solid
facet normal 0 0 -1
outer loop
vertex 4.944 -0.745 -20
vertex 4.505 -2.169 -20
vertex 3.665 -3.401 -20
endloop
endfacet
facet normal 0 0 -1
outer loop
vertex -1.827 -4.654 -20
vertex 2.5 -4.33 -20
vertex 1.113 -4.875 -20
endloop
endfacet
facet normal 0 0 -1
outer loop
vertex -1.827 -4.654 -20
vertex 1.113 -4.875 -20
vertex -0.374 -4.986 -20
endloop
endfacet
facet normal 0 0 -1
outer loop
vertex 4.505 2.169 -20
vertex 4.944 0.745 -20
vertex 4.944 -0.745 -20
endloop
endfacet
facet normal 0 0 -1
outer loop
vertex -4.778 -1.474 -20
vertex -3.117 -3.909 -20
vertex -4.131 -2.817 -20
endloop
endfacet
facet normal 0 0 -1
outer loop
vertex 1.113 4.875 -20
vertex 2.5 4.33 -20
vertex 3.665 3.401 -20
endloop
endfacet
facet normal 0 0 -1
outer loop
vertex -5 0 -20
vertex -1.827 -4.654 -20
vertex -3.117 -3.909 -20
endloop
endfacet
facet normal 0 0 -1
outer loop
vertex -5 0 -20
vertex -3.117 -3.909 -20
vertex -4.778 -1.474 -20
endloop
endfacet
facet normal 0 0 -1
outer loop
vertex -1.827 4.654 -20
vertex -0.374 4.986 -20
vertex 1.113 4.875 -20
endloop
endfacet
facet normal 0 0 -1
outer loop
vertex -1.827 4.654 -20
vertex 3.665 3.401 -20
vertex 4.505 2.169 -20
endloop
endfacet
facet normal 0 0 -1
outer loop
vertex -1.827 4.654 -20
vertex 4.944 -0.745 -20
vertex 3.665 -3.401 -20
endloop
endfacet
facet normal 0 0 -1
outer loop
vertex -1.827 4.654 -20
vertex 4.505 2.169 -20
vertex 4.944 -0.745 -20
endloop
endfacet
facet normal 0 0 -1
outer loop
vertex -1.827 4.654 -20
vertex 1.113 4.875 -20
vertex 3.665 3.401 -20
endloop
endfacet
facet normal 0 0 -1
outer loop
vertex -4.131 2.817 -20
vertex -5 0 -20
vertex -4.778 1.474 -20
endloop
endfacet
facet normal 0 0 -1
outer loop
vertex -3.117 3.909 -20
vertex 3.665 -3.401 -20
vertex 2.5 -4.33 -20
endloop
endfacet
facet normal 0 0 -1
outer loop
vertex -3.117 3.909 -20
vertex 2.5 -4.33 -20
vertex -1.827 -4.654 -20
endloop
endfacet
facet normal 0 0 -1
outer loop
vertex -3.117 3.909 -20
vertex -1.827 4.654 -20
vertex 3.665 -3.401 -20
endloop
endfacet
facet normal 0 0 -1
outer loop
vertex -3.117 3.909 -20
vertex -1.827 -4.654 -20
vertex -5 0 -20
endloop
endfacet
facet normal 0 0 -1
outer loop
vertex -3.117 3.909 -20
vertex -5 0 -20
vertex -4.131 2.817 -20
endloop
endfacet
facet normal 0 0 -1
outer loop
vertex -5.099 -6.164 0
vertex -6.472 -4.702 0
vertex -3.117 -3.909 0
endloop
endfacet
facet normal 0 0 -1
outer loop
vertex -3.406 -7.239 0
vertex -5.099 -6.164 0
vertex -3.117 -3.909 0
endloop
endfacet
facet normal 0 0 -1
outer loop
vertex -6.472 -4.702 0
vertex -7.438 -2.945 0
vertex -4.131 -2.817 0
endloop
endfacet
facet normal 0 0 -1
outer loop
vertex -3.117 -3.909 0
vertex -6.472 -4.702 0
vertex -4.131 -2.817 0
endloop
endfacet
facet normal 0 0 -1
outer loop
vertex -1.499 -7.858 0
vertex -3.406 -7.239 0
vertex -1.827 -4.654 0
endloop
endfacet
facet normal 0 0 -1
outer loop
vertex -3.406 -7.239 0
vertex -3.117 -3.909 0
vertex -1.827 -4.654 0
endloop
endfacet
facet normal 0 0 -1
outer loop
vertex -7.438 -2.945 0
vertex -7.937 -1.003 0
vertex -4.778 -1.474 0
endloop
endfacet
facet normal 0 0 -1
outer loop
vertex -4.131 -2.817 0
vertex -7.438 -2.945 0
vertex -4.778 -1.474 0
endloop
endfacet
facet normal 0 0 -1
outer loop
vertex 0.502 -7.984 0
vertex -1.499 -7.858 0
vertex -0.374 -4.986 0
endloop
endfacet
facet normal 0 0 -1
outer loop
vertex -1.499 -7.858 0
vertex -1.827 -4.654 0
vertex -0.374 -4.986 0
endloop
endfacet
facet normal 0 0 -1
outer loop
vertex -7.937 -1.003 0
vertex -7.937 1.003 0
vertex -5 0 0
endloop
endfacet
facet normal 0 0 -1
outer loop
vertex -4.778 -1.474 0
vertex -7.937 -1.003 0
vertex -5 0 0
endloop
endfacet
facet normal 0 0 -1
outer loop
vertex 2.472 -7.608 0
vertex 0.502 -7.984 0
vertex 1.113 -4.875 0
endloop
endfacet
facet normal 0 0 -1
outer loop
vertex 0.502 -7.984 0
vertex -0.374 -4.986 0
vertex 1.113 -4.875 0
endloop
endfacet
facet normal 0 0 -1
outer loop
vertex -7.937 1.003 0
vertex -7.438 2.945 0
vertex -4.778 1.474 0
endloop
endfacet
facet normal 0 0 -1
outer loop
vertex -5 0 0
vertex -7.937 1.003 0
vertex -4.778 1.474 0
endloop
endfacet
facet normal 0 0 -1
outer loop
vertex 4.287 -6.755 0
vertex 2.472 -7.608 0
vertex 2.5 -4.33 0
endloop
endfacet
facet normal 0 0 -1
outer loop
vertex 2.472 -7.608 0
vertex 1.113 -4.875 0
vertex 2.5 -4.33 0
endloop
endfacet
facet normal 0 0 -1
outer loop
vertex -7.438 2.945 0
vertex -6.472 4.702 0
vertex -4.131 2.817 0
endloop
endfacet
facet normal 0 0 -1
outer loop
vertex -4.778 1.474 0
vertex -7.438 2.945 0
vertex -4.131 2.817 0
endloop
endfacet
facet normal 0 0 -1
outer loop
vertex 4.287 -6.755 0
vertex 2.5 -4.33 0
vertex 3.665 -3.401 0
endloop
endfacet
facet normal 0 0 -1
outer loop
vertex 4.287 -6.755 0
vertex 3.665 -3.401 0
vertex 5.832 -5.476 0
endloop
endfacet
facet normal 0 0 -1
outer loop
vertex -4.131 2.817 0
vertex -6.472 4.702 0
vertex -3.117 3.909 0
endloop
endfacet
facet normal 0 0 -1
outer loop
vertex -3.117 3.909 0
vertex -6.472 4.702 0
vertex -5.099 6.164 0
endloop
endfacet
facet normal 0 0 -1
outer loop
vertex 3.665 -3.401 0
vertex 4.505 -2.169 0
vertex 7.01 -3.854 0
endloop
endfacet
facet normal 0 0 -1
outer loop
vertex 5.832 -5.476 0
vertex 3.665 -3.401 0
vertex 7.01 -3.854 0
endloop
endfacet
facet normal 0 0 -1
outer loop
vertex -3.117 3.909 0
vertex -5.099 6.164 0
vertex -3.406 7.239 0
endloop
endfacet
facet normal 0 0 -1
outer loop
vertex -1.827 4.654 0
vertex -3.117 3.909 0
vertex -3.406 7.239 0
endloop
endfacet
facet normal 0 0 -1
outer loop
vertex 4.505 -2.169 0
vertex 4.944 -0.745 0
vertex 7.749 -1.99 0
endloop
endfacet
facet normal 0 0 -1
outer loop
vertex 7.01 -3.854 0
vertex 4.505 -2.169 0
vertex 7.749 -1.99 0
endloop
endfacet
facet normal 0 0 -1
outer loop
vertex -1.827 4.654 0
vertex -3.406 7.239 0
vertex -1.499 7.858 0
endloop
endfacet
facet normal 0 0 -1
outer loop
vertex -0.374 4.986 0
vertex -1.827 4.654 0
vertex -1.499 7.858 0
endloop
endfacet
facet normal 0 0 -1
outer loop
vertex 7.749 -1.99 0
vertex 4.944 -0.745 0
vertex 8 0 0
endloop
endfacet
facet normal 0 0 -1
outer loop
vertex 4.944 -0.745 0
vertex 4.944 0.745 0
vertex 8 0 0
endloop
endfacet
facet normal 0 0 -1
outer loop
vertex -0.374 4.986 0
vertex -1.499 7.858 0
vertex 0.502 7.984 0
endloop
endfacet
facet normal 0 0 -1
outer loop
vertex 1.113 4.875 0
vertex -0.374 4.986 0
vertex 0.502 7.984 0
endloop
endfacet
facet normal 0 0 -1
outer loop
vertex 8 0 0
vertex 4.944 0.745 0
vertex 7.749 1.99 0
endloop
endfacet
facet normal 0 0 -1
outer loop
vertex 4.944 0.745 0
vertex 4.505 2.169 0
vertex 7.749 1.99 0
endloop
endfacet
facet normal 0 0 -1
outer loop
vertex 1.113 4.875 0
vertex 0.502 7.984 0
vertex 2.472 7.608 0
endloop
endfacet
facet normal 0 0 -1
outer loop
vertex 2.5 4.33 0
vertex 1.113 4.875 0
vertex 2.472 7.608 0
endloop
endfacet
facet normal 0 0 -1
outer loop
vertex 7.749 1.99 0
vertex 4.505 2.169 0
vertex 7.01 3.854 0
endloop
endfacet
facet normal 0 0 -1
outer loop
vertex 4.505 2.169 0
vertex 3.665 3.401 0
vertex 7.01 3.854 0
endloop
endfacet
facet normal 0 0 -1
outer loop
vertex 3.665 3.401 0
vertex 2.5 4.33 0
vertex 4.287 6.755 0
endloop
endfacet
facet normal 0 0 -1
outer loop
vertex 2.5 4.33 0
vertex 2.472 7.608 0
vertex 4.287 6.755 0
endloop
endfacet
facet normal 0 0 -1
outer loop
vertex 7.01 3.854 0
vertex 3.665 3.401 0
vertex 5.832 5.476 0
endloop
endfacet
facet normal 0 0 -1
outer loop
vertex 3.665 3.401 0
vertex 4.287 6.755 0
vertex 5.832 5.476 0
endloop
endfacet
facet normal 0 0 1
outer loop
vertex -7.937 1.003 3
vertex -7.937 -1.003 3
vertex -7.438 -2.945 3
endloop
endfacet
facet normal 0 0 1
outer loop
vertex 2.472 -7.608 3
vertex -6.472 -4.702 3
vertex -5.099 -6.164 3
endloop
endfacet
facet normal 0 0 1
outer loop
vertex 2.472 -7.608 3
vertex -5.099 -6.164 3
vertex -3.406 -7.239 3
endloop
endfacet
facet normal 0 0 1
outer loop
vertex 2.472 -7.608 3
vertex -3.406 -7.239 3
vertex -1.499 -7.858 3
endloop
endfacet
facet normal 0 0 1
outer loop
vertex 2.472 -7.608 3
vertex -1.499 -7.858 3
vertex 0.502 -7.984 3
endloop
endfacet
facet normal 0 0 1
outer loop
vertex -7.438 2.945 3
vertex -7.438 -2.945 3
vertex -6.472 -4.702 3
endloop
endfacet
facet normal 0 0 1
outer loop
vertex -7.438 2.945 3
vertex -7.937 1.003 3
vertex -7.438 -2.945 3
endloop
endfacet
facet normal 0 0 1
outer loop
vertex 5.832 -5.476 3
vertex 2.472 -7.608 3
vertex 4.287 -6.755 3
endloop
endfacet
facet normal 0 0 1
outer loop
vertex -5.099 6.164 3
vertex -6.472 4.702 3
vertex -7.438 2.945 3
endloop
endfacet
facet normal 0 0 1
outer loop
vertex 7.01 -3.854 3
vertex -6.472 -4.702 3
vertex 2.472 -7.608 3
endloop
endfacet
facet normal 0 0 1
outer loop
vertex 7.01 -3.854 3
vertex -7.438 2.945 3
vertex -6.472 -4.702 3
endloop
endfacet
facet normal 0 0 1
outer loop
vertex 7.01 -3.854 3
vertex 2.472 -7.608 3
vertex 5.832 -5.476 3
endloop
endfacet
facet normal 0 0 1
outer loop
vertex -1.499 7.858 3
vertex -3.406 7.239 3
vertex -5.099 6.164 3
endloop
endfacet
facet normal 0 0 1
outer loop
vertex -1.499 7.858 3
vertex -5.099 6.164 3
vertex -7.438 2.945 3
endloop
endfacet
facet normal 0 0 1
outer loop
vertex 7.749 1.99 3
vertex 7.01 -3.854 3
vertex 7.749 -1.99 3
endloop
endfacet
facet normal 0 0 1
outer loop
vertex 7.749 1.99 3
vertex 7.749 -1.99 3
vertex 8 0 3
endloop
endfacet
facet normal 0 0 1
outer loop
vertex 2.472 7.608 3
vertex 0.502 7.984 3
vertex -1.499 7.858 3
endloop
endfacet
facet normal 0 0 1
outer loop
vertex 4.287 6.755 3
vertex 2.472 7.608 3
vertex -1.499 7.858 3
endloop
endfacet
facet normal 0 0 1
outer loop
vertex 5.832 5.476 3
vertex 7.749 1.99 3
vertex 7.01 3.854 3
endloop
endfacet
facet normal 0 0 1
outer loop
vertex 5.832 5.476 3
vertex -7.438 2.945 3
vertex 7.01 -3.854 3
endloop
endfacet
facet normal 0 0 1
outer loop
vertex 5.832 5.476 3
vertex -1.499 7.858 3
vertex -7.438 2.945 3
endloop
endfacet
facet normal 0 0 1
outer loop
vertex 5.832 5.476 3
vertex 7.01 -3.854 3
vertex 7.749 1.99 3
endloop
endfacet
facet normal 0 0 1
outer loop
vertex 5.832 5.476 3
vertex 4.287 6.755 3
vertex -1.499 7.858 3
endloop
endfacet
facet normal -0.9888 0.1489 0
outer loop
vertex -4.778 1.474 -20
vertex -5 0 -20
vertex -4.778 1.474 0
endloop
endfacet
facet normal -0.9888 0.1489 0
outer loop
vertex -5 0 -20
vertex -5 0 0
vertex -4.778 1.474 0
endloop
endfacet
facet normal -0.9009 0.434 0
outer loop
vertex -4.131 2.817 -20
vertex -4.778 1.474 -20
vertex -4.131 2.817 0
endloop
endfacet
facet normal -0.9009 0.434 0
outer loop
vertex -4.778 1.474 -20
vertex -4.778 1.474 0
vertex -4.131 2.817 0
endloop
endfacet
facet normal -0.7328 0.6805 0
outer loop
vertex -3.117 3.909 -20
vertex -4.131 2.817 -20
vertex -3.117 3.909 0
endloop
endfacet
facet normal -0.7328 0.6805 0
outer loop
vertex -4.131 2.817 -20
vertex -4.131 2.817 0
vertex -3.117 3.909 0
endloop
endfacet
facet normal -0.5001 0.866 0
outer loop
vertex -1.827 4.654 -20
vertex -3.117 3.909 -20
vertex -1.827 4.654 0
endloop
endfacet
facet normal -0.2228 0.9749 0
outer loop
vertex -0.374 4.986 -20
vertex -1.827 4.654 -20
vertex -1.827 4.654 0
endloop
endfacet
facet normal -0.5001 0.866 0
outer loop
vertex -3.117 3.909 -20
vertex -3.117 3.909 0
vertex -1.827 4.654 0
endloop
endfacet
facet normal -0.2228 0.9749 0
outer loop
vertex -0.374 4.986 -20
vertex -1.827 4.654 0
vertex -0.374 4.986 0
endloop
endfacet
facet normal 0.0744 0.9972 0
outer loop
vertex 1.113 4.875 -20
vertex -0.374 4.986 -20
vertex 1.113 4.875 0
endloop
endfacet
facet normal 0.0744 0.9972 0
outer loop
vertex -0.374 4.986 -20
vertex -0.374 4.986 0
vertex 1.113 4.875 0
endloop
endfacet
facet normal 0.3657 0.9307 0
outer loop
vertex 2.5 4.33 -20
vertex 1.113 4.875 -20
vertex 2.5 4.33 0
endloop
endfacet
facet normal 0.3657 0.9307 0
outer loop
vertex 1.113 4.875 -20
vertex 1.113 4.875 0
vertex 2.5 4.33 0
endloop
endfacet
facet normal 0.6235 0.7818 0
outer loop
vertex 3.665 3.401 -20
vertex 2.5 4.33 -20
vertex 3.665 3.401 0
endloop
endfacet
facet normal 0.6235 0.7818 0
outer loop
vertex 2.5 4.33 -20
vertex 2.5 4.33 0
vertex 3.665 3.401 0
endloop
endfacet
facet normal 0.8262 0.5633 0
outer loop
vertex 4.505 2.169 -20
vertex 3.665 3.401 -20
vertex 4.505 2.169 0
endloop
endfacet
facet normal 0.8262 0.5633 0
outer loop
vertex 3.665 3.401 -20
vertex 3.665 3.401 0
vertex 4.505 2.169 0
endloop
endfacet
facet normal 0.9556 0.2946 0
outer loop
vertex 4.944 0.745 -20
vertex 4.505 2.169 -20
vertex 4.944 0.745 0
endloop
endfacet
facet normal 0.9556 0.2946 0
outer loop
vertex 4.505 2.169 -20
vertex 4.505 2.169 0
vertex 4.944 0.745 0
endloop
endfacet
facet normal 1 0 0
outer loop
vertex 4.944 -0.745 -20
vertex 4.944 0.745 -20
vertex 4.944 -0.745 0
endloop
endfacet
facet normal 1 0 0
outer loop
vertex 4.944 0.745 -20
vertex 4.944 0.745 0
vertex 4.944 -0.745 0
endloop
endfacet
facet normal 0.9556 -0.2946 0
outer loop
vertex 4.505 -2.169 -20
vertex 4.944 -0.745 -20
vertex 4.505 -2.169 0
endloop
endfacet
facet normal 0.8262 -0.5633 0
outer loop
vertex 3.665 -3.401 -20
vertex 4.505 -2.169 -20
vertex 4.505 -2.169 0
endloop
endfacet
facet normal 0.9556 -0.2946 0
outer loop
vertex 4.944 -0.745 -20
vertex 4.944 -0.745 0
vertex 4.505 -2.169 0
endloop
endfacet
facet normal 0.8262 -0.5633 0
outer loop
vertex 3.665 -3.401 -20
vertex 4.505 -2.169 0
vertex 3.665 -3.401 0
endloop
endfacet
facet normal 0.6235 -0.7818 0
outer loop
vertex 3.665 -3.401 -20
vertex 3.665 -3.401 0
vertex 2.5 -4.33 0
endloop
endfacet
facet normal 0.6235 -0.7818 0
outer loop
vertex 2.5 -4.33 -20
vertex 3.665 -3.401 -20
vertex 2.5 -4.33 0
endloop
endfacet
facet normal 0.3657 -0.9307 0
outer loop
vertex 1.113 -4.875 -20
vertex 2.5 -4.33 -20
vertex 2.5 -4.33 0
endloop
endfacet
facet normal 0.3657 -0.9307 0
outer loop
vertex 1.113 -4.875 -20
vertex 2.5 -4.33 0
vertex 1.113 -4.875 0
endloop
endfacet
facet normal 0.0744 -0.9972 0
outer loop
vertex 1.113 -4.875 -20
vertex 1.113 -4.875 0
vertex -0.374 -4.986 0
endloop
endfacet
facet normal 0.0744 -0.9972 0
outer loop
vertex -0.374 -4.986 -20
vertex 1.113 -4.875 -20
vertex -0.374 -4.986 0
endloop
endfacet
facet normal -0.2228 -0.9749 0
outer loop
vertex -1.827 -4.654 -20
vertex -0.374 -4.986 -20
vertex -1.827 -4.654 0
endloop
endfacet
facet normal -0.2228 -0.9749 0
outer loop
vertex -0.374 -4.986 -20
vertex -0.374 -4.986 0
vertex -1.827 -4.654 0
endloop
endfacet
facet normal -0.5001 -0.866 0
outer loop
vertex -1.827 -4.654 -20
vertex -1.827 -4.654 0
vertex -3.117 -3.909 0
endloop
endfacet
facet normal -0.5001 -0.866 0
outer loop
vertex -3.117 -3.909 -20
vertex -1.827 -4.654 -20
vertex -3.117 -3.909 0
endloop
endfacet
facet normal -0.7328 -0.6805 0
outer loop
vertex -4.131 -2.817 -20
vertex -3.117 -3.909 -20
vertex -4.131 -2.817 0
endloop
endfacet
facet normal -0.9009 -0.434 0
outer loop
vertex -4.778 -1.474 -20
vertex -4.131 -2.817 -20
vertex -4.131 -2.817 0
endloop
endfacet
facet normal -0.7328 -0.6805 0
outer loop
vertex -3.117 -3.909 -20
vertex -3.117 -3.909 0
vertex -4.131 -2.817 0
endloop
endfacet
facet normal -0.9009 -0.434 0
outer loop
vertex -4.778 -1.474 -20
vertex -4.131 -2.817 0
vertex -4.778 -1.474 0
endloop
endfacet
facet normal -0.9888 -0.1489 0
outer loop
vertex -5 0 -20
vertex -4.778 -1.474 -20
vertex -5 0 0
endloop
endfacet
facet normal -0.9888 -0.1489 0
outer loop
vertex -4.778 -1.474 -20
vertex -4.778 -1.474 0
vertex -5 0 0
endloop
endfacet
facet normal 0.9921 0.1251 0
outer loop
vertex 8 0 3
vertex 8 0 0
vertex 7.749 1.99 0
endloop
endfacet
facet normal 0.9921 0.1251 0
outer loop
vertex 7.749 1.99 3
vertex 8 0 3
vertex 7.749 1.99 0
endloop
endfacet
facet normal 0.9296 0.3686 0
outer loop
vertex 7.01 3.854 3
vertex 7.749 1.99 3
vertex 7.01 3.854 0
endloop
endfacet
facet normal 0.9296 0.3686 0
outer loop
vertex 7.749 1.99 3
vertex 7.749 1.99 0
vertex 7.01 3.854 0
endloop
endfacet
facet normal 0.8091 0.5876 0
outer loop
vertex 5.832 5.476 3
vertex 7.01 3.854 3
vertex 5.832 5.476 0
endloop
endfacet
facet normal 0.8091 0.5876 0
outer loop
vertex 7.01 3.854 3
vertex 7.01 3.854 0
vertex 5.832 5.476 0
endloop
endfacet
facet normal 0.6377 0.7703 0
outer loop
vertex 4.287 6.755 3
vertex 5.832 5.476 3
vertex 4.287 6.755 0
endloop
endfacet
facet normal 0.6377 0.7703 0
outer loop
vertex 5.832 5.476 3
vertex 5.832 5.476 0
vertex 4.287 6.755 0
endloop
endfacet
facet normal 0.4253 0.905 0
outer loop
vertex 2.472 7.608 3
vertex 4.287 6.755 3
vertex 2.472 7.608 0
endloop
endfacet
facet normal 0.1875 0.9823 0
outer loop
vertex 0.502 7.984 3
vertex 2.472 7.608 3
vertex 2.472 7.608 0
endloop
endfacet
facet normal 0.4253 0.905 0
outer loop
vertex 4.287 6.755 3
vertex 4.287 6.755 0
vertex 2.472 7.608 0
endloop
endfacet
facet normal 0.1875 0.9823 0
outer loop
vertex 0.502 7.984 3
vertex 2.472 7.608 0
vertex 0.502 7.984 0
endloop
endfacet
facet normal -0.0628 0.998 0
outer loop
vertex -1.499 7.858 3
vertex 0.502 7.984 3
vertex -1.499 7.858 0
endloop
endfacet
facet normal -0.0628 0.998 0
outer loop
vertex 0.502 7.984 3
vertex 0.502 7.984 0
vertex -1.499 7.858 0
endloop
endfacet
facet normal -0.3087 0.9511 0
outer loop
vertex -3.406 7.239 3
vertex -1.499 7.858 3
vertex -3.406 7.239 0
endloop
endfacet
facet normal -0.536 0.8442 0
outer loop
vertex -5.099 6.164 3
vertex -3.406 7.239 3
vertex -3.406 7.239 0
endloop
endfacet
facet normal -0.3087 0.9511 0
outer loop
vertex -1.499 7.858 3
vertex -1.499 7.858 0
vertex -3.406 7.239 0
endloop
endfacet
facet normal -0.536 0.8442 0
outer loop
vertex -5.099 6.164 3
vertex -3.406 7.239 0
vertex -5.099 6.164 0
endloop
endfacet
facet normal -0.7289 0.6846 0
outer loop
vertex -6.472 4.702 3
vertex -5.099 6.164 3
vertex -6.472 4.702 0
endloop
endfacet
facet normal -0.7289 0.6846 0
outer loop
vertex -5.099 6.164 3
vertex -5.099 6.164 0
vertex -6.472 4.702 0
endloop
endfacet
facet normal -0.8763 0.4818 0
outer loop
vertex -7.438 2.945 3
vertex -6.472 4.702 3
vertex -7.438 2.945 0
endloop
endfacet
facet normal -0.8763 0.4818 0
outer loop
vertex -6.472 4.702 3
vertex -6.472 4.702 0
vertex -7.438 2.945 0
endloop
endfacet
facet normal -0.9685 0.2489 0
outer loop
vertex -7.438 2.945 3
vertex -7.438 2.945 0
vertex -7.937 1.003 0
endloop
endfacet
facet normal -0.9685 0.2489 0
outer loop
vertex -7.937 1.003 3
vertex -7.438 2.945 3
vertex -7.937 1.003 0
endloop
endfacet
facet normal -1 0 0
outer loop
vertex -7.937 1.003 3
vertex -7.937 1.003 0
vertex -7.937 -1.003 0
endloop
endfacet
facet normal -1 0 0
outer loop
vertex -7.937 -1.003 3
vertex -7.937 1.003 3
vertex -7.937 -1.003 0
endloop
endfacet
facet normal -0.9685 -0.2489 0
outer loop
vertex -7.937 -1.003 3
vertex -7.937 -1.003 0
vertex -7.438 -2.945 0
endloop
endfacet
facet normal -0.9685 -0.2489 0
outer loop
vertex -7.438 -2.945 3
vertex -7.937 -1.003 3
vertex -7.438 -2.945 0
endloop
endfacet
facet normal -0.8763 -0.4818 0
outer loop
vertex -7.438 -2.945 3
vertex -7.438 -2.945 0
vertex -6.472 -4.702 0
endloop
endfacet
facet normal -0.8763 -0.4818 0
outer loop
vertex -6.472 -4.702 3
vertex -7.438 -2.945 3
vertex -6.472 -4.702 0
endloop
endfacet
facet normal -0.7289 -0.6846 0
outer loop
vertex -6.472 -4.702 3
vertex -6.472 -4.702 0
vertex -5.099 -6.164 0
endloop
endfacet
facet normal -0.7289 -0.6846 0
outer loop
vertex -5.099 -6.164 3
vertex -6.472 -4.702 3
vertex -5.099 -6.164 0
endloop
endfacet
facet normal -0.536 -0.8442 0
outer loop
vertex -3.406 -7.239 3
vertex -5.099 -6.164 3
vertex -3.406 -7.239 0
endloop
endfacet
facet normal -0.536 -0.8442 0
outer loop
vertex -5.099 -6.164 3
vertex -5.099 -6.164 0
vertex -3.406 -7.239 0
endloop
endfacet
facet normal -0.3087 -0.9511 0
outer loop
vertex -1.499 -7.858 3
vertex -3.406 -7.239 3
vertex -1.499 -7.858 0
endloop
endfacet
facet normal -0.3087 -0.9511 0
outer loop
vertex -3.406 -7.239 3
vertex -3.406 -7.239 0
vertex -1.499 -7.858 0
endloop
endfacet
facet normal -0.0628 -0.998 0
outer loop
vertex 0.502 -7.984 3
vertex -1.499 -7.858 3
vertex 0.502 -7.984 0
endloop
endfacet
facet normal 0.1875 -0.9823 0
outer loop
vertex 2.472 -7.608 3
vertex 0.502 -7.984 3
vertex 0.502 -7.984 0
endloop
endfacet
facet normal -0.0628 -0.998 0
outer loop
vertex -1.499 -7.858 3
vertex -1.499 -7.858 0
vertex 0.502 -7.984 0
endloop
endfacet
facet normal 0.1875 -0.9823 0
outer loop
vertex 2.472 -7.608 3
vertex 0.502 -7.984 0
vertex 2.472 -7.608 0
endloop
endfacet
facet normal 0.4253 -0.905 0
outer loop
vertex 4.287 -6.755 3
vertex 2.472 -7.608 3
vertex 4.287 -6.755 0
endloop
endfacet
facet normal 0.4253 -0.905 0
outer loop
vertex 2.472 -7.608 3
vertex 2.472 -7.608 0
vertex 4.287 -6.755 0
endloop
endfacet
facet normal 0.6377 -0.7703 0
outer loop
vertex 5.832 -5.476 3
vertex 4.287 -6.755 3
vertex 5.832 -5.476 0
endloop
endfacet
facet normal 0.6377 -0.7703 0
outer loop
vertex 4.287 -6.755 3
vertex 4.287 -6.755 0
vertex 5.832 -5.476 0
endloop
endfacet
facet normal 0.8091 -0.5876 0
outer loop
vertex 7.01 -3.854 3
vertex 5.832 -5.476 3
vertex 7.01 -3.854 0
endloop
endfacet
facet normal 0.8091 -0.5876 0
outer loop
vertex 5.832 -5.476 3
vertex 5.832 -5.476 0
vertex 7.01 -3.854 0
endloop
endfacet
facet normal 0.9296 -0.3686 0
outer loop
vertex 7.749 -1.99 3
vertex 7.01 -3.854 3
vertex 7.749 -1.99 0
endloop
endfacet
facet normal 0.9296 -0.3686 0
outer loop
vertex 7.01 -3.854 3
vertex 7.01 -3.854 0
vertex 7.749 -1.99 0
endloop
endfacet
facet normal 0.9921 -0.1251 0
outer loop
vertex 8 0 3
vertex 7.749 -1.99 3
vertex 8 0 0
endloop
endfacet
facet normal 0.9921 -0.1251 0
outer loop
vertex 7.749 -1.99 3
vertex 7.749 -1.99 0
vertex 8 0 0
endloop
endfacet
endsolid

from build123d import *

# Parameters (mm, degrees)
SKETCH1_R           = 8
BOSS_EXTRUDE1_DEPTH = 3
SKETCH2_R           = 5
BOSS_EXTRUDE2_DEPTH = 10
SKETCH3_R           = 5
BOSS_EXTRUDE3_DEPTH = 10


with BuildPart() as part:
    # Sketch1 → Boss-Extrude1 (new body)
    with BuildSketch(Plane.XY):
        Circle(SKETCH1_R)
    extrude(amount=BOSS_EXTRUDE1_DEPTH)

    # Sketch2 → Boss-Extrude2 (add)
    with BuildSketch(Plane(origin=(0, 0, 0), x_dir=(-1, 0, 0), z_dir=(0, 0, -1))):
        Circle(SKETCH2_R)
    extrude(amount=BOSS_EXTRUDE2_DEPTH)

    # Sketch3 → Boss-Extrude3 (add)
    with BuildSketch(Plane(origin=(0, 0, -10), x_dir=(-1, 0, 0), z_dir=(0, 0, -1))):
        Circle(SKETCH3_R)
    extrude(amount=BOSS_EXTRUDE3_DEPTH)


solid = part.part
